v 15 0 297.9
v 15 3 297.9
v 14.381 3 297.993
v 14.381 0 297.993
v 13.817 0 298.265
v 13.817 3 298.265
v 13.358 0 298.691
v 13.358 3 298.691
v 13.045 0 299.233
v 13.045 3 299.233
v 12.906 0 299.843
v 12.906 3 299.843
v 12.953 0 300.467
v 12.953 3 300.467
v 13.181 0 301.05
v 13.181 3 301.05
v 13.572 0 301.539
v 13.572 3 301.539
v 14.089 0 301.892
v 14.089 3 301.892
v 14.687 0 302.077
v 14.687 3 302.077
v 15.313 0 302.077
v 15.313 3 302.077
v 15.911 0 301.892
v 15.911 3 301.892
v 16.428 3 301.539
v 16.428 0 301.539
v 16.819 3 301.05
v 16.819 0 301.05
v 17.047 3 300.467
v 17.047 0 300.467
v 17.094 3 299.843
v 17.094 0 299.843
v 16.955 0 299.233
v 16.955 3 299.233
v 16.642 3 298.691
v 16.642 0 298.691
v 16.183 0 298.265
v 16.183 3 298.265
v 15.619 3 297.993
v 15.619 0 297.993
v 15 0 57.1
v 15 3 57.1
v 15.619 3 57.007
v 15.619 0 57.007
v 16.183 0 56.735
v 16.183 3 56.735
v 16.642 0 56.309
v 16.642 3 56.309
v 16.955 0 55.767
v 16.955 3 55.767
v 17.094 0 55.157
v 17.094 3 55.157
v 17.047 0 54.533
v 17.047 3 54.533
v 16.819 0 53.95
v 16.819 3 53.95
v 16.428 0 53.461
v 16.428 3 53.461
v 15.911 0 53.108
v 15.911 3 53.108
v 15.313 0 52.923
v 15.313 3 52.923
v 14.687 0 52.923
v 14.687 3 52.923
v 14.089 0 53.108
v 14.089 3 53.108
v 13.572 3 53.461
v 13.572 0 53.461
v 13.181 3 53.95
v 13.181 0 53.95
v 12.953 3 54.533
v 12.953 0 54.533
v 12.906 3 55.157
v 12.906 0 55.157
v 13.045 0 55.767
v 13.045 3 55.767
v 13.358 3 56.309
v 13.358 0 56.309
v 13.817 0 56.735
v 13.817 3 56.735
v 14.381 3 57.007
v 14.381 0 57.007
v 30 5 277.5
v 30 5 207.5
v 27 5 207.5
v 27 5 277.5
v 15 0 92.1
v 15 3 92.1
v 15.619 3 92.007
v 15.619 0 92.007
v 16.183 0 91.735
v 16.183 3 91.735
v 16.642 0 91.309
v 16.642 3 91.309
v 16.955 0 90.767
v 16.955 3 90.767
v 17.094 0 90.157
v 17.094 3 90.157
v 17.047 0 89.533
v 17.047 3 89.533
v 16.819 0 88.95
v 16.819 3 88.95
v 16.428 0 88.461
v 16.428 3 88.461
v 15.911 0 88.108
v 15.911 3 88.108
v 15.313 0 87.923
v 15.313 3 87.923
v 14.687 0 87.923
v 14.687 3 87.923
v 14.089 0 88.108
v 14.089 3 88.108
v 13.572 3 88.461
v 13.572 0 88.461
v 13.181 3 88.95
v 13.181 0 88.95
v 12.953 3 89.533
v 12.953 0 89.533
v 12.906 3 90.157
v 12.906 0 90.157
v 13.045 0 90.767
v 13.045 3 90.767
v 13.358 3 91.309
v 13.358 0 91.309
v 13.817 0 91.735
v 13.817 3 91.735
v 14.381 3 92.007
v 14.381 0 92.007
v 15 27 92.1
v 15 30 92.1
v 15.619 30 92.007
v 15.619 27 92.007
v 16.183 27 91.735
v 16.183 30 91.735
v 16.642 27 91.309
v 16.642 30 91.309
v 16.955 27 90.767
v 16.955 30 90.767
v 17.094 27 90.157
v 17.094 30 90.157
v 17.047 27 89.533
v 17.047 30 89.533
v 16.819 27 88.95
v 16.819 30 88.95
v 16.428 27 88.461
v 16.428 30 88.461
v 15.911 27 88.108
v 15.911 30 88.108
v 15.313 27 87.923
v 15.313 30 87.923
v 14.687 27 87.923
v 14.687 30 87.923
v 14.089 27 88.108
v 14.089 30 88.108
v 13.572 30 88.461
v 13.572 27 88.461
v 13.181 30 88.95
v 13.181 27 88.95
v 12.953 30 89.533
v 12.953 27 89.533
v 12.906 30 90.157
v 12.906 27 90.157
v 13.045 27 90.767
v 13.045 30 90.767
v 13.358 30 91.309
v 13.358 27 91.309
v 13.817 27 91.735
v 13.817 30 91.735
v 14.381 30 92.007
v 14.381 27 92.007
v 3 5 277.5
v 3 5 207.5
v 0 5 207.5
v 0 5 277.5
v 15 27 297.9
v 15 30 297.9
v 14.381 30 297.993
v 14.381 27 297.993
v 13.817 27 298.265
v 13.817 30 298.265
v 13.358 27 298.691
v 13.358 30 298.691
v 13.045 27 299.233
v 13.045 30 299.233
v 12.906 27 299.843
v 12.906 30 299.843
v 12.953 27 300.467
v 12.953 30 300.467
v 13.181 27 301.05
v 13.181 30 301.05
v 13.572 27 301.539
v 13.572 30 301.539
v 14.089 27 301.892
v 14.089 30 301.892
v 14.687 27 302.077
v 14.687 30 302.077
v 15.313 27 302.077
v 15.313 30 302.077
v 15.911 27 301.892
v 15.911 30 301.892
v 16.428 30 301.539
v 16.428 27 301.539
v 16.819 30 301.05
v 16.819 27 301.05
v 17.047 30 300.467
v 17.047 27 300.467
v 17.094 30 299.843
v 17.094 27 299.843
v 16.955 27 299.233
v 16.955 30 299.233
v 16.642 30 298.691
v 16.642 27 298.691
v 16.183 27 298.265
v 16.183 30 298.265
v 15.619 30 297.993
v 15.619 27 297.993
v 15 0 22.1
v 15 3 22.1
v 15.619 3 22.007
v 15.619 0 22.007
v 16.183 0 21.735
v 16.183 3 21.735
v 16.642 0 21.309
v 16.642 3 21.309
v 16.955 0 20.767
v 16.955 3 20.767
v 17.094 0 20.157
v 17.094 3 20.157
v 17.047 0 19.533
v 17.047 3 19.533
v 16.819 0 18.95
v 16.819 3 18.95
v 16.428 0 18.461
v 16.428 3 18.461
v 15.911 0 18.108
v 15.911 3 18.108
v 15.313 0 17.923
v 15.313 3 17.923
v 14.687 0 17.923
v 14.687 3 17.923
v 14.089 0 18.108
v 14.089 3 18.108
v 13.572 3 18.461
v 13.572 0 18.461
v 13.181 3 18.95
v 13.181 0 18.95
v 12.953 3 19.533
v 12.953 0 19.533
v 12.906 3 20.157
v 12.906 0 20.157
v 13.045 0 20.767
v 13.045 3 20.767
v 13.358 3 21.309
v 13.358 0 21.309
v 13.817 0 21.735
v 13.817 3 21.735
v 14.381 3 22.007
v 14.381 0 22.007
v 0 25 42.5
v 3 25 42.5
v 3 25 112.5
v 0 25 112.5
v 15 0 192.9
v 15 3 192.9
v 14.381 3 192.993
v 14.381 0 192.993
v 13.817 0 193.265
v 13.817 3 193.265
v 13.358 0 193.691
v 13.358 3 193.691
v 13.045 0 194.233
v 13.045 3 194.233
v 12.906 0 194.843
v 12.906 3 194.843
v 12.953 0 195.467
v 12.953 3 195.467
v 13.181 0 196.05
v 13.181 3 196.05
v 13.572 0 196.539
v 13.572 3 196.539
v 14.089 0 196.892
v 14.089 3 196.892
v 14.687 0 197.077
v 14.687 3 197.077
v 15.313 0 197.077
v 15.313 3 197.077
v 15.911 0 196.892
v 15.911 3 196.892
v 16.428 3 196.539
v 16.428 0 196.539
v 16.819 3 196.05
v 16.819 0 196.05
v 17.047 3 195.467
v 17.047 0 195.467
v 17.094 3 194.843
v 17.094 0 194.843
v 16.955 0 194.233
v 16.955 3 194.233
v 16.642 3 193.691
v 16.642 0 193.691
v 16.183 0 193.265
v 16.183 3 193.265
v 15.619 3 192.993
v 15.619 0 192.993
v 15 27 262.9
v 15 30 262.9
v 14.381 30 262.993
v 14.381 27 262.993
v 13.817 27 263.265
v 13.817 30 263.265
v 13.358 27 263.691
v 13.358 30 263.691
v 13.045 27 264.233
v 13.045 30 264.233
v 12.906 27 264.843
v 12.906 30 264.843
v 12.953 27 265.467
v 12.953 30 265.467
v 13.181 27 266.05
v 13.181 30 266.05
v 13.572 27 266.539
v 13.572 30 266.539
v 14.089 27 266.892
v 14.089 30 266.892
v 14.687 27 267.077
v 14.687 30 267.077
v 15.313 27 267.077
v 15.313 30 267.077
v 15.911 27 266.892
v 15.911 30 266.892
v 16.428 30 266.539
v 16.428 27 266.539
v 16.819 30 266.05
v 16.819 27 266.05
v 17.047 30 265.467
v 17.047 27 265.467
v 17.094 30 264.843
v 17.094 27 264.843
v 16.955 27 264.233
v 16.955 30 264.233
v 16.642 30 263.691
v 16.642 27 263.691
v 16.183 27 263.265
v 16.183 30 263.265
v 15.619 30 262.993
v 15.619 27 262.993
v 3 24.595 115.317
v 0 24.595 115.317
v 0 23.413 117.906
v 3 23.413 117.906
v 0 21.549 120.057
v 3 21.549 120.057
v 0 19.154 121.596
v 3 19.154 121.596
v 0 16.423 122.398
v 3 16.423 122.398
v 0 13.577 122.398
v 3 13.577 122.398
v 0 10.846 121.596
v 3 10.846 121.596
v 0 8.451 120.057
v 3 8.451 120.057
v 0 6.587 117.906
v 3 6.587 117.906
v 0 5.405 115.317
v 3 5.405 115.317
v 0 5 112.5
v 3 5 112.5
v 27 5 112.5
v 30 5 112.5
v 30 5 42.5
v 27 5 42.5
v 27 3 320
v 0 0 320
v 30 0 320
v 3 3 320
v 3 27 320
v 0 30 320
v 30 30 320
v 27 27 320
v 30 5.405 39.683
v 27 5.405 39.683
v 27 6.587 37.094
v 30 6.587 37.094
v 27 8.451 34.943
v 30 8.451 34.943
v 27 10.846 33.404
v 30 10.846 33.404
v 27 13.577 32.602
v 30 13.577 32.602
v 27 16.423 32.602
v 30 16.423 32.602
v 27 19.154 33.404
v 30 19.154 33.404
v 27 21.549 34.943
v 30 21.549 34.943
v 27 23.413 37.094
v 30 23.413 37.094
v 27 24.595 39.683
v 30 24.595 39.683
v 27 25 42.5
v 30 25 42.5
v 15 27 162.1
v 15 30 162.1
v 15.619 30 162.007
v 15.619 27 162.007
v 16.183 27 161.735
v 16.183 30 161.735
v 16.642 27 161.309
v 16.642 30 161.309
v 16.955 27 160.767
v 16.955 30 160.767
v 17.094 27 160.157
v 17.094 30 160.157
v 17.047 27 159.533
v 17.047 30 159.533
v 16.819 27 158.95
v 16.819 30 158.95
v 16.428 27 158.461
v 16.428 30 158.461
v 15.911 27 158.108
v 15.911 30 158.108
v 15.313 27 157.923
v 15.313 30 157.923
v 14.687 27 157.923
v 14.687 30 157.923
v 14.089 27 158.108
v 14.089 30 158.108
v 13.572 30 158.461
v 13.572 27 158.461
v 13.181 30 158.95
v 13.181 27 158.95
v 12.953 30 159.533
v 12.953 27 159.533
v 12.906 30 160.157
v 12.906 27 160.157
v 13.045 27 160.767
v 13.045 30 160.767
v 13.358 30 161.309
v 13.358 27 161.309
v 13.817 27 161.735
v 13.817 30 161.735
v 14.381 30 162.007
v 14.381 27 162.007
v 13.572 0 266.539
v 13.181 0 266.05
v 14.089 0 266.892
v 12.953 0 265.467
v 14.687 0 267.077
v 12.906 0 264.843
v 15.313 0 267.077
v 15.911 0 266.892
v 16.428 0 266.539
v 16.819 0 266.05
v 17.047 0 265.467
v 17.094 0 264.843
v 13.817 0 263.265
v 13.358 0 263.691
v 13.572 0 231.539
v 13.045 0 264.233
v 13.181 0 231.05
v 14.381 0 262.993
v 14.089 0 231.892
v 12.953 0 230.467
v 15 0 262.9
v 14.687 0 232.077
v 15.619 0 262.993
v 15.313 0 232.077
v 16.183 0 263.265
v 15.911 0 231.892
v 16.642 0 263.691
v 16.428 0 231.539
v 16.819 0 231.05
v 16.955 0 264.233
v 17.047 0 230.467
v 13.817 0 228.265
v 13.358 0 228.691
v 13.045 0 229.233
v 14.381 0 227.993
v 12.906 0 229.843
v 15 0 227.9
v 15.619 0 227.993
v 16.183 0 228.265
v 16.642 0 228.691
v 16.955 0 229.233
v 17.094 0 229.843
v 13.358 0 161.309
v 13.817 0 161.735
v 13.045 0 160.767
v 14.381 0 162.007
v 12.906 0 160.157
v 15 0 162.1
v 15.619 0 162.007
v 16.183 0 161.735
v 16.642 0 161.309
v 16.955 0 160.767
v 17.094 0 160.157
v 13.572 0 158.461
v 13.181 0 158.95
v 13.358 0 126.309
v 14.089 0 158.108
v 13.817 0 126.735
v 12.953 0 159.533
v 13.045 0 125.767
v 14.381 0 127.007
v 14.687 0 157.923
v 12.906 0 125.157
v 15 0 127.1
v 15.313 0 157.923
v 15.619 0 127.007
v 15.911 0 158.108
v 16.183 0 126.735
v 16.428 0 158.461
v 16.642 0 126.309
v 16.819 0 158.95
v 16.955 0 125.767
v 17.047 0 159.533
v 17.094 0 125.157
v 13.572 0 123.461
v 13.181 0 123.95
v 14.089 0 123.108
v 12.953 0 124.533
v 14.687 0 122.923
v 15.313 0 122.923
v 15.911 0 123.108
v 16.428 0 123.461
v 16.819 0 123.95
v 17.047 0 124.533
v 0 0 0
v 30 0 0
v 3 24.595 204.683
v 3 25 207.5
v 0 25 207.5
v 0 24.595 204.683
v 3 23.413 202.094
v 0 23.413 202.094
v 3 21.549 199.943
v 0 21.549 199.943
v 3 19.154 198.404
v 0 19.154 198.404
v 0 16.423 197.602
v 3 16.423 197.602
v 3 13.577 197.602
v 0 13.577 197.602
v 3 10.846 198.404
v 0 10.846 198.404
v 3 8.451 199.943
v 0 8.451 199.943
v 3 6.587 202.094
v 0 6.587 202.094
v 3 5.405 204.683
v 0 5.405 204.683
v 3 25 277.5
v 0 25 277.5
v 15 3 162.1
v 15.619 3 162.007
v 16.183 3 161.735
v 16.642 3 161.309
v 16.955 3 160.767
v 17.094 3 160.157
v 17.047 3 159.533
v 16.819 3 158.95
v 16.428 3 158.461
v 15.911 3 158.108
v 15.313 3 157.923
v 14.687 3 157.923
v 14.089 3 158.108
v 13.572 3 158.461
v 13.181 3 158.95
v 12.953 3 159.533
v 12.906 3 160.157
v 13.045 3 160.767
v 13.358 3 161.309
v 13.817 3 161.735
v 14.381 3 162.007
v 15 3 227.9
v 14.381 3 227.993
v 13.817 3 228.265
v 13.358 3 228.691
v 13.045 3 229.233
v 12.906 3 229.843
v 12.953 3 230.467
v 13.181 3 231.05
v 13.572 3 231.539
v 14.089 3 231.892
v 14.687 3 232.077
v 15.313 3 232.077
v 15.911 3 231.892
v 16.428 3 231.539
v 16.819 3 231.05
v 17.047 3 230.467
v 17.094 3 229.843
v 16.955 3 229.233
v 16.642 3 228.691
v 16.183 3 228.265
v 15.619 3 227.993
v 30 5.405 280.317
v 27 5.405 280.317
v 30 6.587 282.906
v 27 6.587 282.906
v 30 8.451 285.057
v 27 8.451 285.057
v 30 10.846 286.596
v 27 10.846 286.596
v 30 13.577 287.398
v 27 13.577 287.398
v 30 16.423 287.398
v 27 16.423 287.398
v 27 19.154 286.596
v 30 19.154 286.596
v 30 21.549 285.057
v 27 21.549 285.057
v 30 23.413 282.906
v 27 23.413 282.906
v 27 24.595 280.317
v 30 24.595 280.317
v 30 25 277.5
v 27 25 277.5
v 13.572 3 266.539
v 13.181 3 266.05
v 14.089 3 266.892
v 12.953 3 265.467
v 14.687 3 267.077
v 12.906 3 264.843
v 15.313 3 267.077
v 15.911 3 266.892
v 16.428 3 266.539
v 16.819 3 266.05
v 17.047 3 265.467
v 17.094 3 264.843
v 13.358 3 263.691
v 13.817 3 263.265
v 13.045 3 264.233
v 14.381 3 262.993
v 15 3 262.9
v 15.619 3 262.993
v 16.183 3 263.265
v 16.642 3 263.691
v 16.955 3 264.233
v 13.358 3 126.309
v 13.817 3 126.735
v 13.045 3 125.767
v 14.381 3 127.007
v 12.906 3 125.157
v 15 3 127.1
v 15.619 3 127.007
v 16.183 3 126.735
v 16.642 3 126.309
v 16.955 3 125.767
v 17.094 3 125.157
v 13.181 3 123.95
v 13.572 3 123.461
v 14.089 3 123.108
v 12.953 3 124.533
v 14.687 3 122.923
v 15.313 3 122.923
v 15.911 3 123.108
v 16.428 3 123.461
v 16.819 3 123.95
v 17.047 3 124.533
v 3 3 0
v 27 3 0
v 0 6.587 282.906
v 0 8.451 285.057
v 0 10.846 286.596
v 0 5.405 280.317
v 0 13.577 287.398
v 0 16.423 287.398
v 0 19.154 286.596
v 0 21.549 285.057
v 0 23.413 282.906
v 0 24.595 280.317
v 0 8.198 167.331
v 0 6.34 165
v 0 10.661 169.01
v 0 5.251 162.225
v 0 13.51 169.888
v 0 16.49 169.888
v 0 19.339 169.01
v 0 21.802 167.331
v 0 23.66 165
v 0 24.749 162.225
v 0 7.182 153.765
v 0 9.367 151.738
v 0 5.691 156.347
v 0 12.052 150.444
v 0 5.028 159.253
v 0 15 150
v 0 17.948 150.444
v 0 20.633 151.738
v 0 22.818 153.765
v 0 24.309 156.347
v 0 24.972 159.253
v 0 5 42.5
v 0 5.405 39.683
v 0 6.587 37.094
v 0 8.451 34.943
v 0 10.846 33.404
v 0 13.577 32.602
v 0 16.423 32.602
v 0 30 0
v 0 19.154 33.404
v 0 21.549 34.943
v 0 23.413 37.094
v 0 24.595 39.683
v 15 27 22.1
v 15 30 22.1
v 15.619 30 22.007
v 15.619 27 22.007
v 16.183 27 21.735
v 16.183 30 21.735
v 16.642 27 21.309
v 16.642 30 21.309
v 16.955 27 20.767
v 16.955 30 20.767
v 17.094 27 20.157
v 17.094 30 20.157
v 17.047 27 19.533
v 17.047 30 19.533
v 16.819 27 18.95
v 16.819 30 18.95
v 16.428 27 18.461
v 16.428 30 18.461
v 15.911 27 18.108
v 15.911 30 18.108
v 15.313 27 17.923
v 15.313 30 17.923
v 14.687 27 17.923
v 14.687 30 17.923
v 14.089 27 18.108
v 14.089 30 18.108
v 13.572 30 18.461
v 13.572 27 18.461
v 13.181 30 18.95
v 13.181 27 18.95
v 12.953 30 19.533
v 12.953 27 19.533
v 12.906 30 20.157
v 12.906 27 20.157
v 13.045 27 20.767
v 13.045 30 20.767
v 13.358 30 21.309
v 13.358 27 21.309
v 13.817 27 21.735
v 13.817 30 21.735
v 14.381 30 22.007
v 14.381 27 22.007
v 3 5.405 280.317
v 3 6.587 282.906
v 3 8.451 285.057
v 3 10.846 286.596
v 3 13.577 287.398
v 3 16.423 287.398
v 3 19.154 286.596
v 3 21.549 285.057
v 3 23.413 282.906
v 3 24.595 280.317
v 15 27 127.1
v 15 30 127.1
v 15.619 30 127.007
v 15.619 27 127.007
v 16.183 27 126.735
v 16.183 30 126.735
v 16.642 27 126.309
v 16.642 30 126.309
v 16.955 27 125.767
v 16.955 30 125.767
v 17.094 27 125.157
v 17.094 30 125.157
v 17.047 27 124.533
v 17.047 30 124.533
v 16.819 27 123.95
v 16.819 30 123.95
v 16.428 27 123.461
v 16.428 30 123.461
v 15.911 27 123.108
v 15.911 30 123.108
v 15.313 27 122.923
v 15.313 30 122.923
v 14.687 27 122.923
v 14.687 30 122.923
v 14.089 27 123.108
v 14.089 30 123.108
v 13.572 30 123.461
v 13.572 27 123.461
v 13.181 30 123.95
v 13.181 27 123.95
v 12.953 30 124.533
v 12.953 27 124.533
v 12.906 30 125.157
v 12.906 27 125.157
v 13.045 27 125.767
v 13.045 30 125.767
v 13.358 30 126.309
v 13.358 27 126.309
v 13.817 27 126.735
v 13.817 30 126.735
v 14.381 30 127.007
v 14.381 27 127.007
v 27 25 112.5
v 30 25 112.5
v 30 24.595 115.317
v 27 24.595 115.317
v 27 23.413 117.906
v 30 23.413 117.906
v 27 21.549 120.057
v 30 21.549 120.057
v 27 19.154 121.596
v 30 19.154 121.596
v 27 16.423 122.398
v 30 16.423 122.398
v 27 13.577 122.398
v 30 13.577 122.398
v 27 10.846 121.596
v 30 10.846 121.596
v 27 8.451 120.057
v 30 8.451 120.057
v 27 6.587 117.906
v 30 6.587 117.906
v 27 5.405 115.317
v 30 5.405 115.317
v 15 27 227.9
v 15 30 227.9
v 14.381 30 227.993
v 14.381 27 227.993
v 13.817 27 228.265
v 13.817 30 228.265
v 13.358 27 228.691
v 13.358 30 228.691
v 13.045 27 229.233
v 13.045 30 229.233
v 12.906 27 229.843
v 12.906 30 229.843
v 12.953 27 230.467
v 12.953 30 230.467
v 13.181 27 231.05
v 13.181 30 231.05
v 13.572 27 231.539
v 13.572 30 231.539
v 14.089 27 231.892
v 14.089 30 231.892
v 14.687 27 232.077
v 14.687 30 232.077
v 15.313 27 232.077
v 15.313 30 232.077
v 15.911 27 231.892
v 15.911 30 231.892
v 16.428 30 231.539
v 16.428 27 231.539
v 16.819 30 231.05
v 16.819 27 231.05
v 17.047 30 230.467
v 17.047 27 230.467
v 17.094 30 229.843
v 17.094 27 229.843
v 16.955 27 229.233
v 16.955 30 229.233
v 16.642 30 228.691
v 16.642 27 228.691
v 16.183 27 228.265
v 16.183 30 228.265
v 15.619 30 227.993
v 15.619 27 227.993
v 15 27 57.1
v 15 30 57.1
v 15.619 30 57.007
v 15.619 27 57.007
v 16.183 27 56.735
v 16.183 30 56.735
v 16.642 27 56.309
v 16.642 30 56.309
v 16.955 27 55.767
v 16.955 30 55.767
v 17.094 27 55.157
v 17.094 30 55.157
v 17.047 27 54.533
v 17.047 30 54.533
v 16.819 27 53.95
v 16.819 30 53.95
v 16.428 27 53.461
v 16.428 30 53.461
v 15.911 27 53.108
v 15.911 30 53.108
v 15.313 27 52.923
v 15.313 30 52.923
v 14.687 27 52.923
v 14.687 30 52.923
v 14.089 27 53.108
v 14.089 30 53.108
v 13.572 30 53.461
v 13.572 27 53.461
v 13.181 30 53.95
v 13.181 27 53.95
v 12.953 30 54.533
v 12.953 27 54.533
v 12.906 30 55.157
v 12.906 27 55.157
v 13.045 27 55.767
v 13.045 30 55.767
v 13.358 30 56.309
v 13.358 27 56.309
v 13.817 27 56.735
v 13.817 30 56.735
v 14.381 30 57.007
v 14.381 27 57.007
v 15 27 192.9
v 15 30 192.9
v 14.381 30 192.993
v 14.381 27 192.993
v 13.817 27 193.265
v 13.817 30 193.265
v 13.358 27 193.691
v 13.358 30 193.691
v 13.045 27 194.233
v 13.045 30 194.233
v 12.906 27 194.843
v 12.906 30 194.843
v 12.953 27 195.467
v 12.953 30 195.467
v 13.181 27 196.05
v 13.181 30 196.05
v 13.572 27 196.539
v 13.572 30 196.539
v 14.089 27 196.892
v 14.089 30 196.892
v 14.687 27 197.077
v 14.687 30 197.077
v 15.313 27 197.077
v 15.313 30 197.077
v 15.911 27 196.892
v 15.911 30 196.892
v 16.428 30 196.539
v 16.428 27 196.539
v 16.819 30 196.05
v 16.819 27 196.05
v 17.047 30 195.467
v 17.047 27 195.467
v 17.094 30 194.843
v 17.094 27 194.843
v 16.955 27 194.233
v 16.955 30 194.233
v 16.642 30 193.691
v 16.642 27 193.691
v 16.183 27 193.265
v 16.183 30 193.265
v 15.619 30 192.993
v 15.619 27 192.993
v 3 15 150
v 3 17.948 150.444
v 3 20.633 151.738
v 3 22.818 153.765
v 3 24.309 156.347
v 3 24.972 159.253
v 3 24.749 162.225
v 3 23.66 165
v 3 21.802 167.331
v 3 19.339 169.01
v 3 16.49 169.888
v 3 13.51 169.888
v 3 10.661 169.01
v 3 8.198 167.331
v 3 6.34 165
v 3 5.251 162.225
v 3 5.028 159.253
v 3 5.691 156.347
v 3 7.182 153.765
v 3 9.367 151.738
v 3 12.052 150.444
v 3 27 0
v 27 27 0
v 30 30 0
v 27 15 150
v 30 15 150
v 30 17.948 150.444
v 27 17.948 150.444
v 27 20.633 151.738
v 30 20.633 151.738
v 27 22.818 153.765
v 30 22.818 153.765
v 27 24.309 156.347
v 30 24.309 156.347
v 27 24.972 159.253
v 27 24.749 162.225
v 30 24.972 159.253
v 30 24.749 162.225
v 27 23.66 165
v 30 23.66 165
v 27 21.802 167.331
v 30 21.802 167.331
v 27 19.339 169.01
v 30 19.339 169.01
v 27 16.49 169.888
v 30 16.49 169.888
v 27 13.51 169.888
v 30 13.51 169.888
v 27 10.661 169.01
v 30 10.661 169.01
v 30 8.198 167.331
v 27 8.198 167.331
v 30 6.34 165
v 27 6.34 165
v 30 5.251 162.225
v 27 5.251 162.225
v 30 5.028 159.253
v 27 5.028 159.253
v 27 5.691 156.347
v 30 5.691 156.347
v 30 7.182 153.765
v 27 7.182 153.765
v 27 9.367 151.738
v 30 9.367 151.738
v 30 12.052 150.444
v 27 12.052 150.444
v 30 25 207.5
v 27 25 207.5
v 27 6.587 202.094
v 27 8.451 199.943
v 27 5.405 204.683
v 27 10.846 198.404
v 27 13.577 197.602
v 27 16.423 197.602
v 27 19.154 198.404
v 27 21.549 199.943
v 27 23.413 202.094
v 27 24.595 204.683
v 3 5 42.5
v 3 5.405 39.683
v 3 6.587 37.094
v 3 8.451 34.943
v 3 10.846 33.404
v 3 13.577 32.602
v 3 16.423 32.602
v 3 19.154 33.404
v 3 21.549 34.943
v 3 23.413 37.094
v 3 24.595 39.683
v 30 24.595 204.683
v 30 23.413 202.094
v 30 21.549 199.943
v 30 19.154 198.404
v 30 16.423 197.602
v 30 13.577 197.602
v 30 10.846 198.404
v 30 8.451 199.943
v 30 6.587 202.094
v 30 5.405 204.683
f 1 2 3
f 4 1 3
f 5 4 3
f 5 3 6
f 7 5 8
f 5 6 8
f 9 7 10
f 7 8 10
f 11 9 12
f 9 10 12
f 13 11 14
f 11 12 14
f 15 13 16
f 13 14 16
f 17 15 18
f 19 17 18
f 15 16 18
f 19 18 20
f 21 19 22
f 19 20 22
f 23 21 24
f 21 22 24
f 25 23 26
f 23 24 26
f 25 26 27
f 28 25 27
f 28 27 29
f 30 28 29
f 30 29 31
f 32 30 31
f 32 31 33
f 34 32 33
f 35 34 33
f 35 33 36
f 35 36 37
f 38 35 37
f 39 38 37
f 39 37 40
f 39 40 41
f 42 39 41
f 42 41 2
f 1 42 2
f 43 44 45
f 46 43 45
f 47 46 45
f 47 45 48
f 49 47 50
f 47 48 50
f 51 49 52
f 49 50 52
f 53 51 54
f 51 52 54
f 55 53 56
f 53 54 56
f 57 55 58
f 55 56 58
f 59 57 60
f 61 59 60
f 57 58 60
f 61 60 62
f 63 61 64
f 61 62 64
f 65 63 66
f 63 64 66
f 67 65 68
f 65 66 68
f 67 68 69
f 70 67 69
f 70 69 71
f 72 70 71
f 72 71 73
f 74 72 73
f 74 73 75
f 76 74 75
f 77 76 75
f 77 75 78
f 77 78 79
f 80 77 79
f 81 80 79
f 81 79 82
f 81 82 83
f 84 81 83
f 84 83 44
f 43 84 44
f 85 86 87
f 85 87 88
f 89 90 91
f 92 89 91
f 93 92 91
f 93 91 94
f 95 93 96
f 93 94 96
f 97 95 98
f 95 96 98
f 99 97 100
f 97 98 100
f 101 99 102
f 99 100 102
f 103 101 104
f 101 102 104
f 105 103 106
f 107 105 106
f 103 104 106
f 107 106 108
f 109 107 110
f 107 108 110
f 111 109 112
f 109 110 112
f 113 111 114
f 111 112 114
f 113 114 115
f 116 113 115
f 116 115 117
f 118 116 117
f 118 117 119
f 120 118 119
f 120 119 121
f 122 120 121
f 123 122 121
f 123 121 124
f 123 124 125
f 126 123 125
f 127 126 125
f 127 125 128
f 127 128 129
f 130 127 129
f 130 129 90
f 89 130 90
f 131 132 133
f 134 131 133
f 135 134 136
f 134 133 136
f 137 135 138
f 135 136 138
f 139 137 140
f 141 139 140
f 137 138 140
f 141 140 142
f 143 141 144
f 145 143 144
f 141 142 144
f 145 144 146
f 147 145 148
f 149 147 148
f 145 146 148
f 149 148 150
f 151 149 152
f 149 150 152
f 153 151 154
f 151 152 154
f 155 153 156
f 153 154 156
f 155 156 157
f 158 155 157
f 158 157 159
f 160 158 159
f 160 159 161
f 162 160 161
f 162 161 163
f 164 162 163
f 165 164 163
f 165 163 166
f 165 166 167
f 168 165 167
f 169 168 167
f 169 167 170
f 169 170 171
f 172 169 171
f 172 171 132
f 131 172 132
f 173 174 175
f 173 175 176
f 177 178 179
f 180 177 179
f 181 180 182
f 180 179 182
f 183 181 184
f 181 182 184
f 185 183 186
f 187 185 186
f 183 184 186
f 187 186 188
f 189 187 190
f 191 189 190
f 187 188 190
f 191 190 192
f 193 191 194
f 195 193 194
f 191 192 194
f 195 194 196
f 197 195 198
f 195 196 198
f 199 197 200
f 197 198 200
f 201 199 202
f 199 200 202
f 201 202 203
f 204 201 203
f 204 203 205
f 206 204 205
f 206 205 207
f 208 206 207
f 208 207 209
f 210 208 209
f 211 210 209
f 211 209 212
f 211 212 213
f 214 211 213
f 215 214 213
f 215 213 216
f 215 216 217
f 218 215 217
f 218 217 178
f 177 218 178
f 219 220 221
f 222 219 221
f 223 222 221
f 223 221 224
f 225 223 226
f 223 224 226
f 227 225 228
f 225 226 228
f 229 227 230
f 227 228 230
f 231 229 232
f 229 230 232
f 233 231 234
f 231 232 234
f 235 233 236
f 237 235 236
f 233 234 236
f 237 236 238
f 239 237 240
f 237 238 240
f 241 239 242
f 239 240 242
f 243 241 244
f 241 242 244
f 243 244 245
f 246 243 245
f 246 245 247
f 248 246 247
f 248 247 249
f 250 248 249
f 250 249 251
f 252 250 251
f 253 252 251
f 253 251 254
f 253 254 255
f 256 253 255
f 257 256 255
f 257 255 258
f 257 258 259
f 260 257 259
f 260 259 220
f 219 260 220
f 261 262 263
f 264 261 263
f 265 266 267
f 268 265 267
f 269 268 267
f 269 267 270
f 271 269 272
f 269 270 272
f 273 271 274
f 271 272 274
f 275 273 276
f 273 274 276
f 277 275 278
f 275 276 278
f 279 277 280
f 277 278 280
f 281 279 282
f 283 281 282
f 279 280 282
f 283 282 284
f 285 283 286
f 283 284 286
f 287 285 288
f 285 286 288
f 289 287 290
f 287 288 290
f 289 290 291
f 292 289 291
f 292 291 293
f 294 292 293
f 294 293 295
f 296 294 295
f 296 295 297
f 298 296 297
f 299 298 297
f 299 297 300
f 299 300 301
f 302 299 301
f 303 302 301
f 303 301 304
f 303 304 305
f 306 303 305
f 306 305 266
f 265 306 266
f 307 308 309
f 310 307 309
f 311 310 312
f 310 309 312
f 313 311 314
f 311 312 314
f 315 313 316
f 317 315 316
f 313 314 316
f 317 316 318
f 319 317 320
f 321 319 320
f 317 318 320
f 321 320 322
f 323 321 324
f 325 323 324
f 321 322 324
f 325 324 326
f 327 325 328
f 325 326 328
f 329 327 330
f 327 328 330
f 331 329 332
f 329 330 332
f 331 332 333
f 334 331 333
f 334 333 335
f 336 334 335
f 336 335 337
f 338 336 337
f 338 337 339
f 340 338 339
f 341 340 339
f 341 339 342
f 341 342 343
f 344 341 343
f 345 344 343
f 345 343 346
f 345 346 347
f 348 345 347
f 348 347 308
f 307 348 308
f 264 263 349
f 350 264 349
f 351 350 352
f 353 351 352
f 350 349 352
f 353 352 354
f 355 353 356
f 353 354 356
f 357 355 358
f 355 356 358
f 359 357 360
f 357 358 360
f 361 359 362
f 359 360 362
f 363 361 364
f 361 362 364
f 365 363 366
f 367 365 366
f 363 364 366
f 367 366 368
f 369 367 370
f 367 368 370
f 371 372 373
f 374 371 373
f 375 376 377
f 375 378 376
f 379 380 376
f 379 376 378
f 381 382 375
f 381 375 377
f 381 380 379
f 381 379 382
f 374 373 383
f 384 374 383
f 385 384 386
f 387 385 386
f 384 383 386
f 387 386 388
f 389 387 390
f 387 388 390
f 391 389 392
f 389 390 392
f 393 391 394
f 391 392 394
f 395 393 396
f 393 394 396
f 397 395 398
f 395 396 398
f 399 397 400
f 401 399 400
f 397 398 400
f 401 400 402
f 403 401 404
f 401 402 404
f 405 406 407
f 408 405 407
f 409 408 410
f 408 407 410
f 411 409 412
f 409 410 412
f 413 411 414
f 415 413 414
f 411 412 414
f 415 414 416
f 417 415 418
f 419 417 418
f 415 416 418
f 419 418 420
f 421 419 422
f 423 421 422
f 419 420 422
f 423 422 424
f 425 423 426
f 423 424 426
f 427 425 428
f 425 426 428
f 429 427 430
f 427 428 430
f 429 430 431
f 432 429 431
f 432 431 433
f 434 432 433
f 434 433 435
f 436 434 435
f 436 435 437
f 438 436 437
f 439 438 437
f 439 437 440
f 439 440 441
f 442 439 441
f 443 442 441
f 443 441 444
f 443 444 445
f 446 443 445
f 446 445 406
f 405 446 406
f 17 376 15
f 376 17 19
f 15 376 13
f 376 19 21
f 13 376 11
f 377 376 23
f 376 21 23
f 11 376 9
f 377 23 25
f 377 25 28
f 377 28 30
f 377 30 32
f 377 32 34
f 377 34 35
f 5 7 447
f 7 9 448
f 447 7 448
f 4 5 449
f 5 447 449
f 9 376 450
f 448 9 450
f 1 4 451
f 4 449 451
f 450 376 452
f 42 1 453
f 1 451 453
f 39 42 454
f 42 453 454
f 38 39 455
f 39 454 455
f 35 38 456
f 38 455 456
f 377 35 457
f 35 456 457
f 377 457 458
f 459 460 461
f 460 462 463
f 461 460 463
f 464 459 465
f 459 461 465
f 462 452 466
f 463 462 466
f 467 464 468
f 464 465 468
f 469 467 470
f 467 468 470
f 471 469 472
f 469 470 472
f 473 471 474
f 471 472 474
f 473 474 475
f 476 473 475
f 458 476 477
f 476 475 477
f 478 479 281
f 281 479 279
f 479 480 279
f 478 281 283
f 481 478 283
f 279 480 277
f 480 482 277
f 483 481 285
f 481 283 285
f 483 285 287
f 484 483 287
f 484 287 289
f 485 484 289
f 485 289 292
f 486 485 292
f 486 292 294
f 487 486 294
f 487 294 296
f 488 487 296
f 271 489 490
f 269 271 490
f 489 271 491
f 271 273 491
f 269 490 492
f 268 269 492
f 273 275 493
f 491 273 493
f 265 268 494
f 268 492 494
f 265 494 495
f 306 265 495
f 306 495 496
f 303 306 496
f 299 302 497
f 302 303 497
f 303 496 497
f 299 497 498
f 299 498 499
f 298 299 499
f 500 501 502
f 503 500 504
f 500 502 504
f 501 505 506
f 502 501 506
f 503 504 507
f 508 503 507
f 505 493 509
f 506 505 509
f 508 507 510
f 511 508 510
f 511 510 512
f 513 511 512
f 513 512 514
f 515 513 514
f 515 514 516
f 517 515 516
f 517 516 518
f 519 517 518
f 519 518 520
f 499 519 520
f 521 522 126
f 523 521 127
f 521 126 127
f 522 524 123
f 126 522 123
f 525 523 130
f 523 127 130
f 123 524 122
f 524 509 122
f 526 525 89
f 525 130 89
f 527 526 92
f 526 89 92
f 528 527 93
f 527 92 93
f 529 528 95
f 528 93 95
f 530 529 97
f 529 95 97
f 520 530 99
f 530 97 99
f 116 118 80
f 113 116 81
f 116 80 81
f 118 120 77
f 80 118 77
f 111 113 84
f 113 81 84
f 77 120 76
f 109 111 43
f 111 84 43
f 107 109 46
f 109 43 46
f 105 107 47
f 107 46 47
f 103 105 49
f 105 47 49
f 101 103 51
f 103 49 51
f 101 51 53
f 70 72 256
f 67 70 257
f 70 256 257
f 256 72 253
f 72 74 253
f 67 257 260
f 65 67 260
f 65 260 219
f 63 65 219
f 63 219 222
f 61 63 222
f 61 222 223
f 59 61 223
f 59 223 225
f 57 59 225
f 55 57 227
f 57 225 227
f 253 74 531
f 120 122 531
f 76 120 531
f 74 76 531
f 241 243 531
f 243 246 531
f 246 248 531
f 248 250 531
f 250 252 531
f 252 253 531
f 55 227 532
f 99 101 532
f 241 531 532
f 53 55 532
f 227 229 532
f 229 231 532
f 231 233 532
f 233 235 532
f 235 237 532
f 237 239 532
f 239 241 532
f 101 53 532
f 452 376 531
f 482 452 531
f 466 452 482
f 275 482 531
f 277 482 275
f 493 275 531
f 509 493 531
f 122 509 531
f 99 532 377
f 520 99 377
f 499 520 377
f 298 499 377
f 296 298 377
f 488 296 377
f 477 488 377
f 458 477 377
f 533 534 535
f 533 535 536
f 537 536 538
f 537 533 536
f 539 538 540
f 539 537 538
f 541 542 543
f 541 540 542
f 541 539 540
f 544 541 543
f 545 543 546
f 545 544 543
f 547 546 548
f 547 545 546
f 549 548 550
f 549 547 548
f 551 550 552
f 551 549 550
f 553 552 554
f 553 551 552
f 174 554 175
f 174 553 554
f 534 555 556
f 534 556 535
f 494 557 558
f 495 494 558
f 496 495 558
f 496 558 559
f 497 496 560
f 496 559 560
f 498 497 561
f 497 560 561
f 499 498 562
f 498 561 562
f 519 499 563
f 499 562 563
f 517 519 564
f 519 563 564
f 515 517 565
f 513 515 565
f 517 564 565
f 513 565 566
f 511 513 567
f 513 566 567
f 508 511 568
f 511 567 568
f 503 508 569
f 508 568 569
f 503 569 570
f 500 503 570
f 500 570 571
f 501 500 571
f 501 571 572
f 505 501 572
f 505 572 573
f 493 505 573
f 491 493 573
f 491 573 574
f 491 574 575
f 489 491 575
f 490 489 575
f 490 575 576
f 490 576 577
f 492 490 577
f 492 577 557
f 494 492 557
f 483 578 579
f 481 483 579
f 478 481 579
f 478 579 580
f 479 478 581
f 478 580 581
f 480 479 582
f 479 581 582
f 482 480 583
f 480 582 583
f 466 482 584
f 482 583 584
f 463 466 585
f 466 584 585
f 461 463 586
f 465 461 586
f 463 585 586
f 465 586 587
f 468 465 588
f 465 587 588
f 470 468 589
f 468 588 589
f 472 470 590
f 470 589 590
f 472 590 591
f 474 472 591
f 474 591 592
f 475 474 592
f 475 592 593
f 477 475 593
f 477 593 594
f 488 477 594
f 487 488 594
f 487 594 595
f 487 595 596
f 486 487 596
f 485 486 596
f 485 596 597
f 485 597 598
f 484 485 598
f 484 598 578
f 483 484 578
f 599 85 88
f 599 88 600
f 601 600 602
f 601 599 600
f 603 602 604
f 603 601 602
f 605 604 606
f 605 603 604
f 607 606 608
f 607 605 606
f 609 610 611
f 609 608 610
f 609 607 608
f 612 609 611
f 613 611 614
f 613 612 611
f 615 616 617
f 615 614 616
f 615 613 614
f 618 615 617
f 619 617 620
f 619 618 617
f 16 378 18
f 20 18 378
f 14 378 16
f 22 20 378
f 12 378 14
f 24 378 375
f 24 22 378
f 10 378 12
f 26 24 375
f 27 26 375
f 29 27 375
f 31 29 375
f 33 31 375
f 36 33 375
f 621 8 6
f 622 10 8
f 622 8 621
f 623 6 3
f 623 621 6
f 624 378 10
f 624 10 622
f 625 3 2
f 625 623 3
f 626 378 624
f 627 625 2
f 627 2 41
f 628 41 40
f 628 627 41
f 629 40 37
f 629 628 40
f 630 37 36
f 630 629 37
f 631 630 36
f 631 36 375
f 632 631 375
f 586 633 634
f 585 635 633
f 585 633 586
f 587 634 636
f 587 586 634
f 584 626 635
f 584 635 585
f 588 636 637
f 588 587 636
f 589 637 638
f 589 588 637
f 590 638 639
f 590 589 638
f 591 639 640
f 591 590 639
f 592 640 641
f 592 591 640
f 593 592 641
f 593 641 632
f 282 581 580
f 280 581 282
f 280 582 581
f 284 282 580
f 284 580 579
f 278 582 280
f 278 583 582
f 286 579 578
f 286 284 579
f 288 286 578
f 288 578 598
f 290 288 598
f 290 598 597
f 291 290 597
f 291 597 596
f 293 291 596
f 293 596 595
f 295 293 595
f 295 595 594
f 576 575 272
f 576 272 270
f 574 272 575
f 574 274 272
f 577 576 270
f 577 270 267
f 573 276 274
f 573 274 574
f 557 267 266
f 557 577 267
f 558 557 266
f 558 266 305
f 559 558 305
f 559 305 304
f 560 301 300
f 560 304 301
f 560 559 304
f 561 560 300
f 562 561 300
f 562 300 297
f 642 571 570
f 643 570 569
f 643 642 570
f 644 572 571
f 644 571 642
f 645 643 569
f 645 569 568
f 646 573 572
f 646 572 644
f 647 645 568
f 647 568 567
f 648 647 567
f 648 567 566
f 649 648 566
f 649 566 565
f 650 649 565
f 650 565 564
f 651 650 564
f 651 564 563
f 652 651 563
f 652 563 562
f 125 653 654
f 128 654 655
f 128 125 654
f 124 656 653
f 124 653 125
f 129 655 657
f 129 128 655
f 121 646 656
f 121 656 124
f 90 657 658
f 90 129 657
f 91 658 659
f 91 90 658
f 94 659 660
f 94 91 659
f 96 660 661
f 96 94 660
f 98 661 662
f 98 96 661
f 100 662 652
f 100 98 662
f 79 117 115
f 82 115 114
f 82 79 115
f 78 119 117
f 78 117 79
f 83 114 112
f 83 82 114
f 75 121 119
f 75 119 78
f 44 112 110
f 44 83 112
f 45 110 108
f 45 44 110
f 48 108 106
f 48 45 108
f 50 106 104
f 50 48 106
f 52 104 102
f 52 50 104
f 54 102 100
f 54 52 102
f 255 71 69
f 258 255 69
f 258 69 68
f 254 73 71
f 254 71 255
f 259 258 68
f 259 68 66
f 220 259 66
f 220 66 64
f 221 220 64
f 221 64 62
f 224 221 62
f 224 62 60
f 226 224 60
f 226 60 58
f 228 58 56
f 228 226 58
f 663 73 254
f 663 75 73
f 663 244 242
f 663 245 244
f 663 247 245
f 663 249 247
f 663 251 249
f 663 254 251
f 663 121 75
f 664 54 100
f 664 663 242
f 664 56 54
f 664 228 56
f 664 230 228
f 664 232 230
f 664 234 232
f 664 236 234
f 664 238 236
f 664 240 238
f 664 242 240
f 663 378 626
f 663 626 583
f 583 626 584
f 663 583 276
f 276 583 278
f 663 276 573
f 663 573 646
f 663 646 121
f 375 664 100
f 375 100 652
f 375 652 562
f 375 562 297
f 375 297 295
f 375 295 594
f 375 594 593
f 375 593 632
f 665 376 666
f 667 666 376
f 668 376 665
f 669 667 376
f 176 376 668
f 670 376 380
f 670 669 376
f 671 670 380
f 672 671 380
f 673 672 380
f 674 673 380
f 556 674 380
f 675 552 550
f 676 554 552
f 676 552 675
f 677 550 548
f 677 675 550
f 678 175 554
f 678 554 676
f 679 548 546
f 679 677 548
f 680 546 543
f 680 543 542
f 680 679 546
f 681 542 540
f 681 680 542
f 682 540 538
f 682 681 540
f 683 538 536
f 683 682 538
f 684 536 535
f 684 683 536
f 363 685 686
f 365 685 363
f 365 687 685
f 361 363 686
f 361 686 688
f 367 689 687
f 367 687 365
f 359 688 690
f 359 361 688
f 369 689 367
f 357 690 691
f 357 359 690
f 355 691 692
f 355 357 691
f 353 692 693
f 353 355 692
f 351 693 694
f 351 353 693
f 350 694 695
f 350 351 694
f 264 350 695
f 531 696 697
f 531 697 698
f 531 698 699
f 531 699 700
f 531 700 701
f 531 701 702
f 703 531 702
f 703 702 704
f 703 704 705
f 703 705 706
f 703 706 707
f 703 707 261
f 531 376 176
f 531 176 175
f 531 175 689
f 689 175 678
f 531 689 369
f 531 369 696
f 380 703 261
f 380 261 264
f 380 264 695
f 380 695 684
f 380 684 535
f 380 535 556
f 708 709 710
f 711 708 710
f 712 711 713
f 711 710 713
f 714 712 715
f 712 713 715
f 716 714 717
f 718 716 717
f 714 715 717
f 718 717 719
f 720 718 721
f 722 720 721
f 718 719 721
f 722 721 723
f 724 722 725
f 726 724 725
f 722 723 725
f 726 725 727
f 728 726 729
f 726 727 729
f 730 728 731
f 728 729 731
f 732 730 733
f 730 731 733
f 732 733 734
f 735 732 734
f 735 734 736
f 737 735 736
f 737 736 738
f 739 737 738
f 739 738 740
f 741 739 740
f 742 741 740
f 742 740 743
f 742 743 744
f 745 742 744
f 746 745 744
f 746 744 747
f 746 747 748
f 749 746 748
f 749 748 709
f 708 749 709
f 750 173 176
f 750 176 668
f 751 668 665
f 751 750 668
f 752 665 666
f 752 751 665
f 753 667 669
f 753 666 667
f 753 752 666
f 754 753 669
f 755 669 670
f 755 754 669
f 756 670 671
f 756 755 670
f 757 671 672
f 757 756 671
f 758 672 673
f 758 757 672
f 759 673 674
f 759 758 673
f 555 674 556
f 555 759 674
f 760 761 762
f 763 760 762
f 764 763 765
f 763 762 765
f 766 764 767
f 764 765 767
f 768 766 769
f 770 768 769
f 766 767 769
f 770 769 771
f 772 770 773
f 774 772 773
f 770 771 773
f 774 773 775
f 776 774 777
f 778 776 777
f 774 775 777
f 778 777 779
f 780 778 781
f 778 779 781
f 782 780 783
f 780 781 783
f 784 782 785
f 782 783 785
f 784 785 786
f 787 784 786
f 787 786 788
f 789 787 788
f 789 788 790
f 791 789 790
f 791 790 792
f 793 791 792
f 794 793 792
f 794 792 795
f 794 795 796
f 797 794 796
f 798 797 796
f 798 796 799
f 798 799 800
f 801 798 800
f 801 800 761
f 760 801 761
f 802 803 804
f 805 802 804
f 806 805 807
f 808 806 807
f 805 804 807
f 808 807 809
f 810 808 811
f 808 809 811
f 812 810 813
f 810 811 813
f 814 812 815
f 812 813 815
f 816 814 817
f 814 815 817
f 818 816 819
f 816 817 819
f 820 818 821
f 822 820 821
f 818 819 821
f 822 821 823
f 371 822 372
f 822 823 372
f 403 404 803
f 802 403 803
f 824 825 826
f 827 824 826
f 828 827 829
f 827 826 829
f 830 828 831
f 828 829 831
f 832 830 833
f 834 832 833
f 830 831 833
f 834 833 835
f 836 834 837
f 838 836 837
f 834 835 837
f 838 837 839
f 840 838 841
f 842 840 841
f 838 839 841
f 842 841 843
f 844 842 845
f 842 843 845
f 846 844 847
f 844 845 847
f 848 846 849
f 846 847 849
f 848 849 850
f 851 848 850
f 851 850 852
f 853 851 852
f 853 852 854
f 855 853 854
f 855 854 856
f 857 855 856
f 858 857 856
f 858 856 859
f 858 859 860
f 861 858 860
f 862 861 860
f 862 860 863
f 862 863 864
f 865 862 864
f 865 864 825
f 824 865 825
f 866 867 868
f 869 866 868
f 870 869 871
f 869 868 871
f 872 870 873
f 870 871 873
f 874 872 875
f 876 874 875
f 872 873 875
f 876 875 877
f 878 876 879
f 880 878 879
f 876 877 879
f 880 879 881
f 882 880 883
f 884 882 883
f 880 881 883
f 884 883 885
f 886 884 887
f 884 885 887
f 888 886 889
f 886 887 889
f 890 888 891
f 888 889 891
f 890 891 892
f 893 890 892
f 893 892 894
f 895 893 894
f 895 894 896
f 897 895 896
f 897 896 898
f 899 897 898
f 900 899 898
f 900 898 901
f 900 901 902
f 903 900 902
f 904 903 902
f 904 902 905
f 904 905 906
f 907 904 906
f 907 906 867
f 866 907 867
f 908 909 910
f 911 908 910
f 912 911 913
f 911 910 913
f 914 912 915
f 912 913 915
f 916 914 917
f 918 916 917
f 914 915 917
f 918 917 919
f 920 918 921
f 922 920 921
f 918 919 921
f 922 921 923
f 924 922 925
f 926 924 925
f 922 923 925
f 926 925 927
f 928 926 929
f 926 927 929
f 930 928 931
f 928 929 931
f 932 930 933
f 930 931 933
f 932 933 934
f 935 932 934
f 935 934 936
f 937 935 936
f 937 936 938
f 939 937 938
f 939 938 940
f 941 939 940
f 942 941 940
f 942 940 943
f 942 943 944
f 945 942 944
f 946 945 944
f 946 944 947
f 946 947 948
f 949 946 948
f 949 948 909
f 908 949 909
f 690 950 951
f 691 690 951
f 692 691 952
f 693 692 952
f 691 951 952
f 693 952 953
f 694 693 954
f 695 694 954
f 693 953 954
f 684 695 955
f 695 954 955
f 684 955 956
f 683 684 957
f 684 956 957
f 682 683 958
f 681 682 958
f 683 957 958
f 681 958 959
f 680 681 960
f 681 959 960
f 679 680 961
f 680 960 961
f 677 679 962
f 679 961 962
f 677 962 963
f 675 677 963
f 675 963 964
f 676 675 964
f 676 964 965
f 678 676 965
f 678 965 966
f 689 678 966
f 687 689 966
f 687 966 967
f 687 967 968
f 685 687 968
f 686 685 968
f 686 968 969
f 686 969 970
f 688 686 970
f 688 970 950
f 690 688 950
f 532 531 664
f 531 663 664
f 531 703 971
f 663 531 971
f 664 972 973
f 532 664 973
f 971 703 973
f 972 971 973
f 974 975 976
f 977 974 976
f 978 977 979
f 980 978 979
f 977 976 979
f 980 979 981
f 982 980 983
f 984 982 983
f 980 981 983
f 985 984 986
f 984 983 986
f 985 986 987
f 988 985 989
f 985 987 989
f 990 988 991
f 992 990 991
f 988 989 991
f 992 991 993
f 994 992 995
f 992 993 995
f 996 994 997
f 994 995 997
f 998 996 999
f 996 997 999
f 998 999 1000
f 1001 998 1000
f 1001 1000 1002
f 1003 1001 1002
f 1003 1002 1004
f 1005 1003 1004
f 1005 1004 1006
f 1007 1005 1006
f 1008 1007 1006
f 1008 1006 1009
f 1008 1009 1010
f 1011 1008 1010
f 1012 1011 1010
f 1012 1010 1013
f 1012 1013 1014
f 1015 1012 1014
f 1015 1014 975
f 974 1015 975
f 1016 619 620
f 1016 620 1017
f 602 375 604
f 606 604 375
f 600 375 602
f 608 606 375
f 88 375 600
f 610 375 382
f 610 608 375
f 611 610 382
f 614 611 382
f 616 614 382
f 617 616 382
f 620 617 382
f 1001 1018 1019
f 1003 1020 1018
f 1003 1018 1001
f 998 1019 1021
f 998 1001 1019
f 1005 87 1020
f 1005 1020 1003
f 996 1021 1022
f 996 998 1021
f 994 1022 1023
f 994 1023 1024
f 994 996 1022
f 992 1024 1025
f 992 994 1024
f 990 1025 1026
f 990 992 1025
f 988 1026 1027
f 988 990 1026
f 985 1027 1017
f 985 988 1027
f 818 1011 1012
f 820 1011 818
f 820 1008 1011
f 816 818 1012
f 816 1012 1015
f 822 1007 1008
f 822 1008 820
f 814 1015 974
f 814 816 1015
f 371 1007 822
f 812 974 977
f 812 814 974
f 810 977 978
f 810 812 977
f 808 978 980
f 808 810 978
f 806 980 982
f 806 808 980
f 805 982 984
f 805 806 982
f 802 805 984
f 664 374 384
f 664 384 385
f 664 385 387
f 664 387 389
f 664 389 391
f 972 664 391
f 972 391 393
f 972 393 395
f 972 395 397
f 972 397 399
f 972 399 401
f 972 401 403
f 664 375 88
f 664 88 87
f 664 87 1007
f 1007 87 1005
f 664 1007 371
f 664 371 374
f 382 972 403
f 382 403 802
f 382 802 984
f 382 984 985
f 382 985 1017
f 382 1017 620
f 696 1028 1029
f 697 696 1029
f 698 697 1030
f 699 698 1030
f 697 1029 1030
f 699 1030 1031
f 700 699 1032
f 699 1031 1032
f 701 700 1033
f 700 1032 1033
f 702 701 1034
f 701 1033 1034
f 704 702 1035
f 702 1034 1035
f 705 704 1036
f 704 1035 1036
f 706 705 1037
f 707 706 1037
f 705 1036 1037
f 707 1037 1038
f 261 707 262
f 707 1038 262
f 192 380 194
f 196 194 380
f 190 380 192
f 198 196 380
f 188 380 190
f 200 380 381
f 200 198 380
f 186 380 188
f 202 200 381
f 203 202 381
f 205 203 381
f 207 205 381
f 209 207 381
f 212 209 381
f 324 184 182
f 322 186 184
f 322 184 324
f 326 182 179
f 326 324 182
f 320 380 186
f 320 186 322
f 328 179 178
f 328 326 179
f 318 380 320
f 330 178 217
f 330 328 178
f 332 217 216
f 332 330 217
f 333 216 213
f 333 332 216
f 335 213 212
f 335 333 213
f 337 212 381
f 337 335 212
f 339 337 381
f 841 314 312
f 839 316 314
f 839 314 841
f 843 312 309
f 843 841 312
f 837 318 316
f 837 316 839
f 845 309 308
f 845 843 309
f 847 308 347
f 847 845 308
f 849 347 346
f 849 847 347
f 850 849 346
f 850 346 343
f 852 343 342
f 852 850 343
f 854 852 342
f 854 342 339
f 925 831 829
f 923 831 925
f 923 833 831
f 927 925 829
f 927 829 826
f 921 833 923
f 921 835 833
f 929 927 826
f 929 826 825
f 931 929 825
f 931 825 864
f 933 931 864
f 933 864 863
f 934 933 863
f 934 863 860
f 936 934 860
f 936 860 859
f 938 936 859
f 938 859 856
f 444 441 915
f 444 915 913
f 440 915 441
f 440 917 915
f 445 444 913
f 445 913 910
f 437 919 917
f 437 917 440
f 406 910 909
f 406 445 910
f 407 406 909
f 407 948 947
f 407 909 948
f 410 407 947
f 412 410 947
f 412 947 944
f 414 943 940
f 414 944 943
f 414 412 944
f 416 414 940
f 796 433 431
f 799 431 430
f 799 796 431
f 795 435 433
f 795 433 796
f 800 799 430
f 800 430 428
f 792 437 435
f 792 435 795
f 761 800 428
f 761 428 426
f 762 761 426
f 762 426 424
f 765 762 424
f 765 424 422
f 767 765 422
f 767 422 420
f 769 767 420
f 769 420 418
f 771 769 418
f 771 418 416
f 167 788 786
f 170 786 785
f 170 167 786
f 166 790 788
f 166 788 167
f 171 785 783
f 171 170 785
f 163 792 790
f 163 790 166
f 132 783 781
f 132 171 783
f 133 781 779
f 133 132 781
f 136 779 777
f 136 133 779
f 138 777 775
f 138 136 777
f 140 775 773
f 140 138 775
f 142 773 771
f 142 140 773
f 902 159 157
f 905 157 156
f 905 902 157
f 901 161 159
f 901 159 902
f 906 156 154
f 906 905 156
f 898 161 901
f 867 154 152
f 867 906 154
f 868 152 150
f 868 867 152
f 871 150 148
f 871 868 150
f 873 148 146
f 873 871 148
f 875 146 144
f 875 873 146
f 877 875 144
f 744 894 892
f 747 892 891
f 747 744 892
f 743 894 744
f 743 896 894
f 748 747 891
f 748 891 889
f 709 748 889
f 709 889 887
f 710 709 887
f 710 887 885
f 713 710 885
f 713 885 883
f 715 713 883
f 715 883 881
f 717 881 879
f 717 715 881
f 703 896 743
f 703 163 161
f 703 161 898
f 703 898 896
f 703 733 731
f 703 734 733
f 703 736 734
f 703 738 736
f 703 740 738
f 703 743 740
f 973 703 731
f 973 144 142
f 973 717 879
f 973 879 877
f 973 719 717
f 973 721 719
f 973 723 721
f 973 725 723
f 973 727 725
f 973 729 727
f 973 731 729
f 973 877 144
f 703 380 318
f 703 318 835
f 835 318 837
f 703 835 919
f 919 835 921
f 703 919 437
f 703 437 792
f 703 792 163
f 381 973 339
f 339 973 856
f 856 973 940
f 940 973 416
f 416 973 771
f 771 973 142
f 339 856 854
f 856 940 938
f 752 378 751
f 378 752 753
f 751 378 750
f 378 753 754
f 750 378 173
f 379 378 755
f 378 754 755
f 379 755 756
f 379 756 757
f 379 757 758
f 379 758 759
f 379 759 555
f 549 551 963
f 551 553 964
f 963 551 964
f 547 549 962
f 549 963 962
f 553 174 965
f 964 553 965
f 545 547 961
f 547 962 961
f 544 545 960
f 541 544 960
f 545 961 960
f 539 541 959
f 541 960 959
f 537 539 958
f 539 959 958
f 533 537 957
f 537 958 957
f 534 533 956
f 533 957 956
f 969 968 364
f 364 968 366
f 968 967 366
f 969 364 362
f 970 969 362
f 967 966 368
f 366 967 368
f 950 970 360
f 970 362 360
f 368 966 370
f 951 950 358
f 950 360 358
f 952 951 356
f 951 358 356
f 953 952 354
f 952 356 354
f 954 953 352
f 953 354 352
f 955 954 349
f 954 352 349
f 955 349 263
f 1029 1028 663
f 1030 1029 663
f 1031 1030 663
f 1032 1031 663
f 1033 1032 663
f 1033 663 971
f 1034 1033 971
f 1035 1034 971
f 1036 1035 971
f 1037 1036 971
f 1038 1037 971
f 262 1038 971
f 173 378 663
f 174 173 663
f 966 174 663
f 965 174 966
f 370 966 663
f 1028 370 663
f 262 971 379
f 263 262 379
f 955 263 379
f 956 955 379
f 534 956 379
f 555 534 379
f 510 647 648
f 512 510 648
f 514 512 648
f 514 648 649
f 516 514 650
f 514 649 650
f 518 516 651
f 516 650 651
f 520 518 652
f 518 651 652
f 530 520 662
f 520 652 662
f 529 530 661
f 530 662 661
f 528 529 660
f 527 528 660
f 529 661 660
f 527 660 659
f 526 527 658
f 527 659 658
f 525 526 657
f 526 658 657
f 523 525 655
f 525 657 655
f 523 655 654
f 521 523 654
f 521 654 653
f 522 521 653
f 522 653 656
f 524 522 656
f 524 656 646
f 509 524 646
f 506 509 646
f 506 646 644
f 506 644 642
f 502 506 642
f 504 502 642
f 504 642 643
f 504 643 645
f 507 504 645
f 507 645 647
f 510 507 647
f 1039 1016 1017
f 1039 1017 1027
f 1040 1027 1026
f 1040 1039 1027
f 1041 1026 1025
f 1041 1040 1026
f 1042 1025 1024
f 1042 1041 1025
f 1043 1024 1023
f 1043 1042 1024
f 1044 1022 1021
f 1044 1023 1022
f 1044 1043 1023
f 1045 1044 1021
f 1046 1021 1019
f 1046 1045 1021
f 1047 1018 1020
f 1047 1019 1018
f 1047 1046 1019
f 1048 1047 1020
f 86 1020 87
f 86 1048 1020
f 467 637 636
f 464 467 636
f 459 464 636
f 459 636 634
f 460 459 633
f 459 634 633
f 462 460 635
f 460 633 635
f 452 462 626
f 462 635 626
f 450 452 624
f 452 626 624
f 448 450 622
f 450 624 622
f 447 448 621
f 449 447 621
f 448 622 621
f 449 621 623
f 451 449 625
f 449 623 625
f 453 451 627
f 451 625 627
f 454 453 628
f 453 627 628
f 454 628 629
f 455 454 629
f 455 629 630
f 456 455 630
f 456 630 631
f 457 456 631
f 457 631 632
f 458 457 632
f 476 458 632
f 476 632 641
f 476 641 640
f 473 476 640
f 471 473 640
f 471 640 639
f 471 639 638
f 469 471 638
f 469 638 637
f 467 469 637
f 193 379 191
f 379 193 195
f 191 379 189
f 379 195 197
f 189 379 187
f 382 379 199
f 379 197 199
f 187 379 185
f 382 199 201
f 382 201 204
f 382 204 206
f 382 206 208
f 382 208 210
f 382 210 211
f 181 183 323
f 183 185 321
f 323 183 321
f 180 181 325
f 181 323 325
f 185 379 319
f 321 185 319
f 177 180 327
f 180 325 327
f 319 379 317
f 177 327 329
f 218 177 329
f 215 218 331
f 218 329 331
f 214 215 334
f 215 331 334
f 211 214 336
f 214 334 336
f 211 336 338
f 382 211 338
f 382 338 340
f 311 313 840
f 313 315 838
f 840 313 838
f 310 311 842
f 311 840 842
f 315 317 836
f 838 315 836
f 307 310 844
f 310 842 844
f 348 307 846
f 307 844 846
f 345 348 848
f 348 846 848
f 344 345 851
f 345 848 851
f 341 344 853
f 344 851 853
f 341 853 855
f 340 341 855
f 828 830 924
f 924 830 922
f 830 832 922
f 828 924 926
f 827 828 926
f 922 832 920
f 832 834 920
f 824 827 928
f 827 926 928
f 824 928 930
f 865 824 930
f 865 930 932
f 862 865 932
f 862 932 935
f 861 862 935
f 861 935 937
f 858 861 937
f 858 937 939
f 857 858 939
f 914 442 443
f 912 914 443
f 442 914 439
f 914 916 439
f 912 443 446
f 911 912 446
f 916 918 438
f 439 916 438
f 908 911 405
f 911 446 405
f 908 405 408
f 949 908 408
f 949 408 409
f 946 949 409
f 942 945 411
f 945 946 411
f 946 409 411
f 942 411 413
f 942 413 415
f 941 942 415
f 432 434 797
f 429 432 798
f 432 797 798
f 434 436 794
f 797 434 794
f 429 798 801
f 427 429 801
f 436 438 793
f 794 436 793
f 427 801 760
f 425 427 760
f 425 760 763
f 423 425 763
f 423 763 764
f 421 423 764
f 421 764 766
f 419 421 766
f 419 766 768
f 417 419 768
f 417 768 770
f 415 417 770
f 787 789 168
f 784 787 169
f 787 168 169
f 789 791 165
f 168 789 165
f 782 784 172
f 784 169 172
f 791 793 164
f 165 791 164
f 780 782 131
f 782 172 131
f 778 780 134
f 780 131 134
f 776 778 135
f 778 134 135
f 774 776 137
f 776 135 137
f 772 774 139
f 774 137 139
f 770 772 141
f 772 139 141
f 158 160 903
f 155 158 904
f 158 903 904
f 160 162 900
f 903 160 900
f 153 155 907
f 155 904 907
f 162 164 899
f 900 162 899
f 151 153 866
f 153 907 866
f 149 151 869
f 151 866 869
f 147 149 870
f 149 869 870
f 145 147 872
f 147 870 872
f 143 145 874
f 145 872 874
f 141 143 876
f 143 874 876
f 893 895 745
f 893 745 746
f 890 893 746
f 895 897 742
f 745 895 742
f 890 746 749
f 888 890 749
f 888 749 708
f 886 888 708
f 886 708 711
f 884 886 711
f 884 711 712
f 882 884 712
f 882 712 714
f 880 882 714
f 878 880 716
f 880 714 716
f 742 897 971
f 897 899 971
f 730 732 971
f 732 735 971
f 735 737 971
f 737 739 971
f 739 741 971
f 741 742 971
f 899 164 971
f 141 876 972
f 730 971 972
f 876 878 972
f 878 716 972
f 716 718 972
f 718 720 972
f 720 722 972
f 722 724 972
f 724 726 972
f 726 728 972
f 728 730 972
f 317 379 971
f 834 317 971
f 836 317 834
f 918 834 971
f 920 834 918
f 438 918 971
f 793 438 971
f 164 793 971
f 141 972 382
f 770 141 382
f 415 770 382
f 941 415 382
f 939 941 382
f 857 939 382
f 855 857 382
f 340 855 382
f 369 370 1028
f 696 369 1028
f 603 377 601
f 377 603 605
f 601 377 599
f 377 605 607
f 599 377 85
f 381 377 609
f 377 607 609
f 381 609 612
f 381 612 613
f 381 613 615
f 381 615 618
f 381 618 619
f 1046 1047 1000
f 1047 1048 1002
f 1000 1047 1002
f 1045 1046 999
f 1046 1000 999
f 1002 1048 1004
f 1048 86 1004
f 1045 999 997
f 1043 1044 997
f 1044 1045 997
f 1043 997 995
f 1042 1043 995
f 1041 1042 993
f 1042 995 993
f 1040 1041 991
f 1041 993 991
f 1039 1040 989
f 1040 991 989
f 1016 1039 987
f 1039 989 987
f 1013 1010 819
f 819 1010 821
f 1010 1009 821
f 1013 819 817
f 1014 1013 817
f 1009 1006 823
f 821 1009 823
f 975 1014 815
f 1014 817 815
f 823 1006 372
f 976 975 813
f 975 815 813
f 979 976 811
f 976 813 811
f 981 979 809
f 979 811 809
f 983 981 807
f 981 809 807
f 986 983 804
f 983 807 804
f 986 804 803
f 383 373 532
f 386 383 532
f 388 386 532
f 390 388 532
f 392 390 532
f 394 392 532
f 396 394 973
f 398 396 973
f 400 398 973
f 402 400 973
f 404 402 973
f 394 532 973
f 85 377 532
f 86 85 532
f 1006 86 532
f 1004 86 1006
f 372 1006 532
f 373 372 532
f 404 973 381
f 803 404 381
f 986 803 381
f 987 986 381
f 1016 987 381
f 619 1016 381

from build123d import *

# Parameters (mm, degrees)
SKETCH_1_W          = 30
SKETCH_1_H          = 30
SKETCH_1_W_2        = 24
SKETCH_1_H_2        = 24
EXTRUDE_1_DEPTH     = 320
SKETCH_2_R          = 10
CUT_EXTRUDE_1_DEPTH = 323.800247831
SKETCH_3_R          = 2.1
CUT_EXTRUDE_2_DEPTH = 323.800247831


with BuildPart() as part:
    # 草图1 → 拉伸-薄壁1 (new body)
    with BuildSketch(Plane.XY):
        with Locations((15, 15)):
            Rectangle(SKETCH_1_W, SKETCH_1_H)
        with Locations((15, 15)):
            Rectangle(SKETCH_1_W_2, SKETCH_1_H_2, mode=Mode.SUBTRACT)
    extrude(amount=EXTRUDE_1_DEPTH)

    # 草图2 → 切除-拉伸1 (cut, through all)
    with BuildSketch(Plane(origin=(30, 0, 0), x_dir=(0, 0, -1), z_dir=(1, 0, 0))):
        with Locations((-160, 15)):
            Circle(SKETCH_2_R)
        with BuildLine():
            Line((-277.5, 25), (-207.5, 25))
            ThreePointArc((-207.5, 25), (-197.5, 15), (-207.5, 5))
            Line((-207.5, 5), (-277.5, 5))
            ThreePointArc((-277.5, 5), (-287.5, 15), (-277.5, 25))
        make_face()
        with BuildLine():
            Line((-42.5, 25), (-112.5, 25))
            ThreePointArc((-112.5, 25), (-122.5, 15), (-112.5, 5))
            Line((-112.5, 5), (-42.5, 5))
            ThreePointArc((-42.5, 5), (-32.5, 15), (-42.5, 25))
        make_face()
    extrude(amount=-CUT_EXTRUDE_1_DEPTH, mode=Mode.SUBTRACT)

    # 草图3 → 切除-拉伸2 (cut, through all)
    with BuildSketch(Plane(origin=(0, 30, 0), x_dir=(1, 0, 0), z_dir=(0, 1, 0))):
        with Locations(Location((15, -20, 0), (0, 0, 270))):
            Circle(SKETCH_3_R)
        with Locations(Location((15, -55, 0), (0, 0, 270))):
            Circle(SKETCH_3_R)
        with Locations(Location((15, -90, 0), (0, 0, 270))):
            Circle(SKETCH_3_R)
        with Locations(Location((15, -125, 0), (0, 0, 270))):
            Circle(SKETCH_3_R)
        with Locations(Location((15, -300, 0), (0, 0, 90))):
            Circle(SKETCH_3_R)
        with Locations(Location((15, -265, 0), (0, 0, 90))):
            Circle(SKETCH_3_R)
        with Locations(Location((15, -230, 0), (0, 0, 90))):
            Circle(SKETCH_3_R)
        with Locations(Location((15, -195, 0), (0, 0, 90))):
            Circle(SKETCH_3_R)
        with Locations(Location((15, -160, 0), (0, 0, 270))):
            Circle(SKETCH_3_R)
    extrude(amount=-CUT_EXTRUDE_2_DEPTH, mode=Mode.SUBTRACT)


solid = part.part
